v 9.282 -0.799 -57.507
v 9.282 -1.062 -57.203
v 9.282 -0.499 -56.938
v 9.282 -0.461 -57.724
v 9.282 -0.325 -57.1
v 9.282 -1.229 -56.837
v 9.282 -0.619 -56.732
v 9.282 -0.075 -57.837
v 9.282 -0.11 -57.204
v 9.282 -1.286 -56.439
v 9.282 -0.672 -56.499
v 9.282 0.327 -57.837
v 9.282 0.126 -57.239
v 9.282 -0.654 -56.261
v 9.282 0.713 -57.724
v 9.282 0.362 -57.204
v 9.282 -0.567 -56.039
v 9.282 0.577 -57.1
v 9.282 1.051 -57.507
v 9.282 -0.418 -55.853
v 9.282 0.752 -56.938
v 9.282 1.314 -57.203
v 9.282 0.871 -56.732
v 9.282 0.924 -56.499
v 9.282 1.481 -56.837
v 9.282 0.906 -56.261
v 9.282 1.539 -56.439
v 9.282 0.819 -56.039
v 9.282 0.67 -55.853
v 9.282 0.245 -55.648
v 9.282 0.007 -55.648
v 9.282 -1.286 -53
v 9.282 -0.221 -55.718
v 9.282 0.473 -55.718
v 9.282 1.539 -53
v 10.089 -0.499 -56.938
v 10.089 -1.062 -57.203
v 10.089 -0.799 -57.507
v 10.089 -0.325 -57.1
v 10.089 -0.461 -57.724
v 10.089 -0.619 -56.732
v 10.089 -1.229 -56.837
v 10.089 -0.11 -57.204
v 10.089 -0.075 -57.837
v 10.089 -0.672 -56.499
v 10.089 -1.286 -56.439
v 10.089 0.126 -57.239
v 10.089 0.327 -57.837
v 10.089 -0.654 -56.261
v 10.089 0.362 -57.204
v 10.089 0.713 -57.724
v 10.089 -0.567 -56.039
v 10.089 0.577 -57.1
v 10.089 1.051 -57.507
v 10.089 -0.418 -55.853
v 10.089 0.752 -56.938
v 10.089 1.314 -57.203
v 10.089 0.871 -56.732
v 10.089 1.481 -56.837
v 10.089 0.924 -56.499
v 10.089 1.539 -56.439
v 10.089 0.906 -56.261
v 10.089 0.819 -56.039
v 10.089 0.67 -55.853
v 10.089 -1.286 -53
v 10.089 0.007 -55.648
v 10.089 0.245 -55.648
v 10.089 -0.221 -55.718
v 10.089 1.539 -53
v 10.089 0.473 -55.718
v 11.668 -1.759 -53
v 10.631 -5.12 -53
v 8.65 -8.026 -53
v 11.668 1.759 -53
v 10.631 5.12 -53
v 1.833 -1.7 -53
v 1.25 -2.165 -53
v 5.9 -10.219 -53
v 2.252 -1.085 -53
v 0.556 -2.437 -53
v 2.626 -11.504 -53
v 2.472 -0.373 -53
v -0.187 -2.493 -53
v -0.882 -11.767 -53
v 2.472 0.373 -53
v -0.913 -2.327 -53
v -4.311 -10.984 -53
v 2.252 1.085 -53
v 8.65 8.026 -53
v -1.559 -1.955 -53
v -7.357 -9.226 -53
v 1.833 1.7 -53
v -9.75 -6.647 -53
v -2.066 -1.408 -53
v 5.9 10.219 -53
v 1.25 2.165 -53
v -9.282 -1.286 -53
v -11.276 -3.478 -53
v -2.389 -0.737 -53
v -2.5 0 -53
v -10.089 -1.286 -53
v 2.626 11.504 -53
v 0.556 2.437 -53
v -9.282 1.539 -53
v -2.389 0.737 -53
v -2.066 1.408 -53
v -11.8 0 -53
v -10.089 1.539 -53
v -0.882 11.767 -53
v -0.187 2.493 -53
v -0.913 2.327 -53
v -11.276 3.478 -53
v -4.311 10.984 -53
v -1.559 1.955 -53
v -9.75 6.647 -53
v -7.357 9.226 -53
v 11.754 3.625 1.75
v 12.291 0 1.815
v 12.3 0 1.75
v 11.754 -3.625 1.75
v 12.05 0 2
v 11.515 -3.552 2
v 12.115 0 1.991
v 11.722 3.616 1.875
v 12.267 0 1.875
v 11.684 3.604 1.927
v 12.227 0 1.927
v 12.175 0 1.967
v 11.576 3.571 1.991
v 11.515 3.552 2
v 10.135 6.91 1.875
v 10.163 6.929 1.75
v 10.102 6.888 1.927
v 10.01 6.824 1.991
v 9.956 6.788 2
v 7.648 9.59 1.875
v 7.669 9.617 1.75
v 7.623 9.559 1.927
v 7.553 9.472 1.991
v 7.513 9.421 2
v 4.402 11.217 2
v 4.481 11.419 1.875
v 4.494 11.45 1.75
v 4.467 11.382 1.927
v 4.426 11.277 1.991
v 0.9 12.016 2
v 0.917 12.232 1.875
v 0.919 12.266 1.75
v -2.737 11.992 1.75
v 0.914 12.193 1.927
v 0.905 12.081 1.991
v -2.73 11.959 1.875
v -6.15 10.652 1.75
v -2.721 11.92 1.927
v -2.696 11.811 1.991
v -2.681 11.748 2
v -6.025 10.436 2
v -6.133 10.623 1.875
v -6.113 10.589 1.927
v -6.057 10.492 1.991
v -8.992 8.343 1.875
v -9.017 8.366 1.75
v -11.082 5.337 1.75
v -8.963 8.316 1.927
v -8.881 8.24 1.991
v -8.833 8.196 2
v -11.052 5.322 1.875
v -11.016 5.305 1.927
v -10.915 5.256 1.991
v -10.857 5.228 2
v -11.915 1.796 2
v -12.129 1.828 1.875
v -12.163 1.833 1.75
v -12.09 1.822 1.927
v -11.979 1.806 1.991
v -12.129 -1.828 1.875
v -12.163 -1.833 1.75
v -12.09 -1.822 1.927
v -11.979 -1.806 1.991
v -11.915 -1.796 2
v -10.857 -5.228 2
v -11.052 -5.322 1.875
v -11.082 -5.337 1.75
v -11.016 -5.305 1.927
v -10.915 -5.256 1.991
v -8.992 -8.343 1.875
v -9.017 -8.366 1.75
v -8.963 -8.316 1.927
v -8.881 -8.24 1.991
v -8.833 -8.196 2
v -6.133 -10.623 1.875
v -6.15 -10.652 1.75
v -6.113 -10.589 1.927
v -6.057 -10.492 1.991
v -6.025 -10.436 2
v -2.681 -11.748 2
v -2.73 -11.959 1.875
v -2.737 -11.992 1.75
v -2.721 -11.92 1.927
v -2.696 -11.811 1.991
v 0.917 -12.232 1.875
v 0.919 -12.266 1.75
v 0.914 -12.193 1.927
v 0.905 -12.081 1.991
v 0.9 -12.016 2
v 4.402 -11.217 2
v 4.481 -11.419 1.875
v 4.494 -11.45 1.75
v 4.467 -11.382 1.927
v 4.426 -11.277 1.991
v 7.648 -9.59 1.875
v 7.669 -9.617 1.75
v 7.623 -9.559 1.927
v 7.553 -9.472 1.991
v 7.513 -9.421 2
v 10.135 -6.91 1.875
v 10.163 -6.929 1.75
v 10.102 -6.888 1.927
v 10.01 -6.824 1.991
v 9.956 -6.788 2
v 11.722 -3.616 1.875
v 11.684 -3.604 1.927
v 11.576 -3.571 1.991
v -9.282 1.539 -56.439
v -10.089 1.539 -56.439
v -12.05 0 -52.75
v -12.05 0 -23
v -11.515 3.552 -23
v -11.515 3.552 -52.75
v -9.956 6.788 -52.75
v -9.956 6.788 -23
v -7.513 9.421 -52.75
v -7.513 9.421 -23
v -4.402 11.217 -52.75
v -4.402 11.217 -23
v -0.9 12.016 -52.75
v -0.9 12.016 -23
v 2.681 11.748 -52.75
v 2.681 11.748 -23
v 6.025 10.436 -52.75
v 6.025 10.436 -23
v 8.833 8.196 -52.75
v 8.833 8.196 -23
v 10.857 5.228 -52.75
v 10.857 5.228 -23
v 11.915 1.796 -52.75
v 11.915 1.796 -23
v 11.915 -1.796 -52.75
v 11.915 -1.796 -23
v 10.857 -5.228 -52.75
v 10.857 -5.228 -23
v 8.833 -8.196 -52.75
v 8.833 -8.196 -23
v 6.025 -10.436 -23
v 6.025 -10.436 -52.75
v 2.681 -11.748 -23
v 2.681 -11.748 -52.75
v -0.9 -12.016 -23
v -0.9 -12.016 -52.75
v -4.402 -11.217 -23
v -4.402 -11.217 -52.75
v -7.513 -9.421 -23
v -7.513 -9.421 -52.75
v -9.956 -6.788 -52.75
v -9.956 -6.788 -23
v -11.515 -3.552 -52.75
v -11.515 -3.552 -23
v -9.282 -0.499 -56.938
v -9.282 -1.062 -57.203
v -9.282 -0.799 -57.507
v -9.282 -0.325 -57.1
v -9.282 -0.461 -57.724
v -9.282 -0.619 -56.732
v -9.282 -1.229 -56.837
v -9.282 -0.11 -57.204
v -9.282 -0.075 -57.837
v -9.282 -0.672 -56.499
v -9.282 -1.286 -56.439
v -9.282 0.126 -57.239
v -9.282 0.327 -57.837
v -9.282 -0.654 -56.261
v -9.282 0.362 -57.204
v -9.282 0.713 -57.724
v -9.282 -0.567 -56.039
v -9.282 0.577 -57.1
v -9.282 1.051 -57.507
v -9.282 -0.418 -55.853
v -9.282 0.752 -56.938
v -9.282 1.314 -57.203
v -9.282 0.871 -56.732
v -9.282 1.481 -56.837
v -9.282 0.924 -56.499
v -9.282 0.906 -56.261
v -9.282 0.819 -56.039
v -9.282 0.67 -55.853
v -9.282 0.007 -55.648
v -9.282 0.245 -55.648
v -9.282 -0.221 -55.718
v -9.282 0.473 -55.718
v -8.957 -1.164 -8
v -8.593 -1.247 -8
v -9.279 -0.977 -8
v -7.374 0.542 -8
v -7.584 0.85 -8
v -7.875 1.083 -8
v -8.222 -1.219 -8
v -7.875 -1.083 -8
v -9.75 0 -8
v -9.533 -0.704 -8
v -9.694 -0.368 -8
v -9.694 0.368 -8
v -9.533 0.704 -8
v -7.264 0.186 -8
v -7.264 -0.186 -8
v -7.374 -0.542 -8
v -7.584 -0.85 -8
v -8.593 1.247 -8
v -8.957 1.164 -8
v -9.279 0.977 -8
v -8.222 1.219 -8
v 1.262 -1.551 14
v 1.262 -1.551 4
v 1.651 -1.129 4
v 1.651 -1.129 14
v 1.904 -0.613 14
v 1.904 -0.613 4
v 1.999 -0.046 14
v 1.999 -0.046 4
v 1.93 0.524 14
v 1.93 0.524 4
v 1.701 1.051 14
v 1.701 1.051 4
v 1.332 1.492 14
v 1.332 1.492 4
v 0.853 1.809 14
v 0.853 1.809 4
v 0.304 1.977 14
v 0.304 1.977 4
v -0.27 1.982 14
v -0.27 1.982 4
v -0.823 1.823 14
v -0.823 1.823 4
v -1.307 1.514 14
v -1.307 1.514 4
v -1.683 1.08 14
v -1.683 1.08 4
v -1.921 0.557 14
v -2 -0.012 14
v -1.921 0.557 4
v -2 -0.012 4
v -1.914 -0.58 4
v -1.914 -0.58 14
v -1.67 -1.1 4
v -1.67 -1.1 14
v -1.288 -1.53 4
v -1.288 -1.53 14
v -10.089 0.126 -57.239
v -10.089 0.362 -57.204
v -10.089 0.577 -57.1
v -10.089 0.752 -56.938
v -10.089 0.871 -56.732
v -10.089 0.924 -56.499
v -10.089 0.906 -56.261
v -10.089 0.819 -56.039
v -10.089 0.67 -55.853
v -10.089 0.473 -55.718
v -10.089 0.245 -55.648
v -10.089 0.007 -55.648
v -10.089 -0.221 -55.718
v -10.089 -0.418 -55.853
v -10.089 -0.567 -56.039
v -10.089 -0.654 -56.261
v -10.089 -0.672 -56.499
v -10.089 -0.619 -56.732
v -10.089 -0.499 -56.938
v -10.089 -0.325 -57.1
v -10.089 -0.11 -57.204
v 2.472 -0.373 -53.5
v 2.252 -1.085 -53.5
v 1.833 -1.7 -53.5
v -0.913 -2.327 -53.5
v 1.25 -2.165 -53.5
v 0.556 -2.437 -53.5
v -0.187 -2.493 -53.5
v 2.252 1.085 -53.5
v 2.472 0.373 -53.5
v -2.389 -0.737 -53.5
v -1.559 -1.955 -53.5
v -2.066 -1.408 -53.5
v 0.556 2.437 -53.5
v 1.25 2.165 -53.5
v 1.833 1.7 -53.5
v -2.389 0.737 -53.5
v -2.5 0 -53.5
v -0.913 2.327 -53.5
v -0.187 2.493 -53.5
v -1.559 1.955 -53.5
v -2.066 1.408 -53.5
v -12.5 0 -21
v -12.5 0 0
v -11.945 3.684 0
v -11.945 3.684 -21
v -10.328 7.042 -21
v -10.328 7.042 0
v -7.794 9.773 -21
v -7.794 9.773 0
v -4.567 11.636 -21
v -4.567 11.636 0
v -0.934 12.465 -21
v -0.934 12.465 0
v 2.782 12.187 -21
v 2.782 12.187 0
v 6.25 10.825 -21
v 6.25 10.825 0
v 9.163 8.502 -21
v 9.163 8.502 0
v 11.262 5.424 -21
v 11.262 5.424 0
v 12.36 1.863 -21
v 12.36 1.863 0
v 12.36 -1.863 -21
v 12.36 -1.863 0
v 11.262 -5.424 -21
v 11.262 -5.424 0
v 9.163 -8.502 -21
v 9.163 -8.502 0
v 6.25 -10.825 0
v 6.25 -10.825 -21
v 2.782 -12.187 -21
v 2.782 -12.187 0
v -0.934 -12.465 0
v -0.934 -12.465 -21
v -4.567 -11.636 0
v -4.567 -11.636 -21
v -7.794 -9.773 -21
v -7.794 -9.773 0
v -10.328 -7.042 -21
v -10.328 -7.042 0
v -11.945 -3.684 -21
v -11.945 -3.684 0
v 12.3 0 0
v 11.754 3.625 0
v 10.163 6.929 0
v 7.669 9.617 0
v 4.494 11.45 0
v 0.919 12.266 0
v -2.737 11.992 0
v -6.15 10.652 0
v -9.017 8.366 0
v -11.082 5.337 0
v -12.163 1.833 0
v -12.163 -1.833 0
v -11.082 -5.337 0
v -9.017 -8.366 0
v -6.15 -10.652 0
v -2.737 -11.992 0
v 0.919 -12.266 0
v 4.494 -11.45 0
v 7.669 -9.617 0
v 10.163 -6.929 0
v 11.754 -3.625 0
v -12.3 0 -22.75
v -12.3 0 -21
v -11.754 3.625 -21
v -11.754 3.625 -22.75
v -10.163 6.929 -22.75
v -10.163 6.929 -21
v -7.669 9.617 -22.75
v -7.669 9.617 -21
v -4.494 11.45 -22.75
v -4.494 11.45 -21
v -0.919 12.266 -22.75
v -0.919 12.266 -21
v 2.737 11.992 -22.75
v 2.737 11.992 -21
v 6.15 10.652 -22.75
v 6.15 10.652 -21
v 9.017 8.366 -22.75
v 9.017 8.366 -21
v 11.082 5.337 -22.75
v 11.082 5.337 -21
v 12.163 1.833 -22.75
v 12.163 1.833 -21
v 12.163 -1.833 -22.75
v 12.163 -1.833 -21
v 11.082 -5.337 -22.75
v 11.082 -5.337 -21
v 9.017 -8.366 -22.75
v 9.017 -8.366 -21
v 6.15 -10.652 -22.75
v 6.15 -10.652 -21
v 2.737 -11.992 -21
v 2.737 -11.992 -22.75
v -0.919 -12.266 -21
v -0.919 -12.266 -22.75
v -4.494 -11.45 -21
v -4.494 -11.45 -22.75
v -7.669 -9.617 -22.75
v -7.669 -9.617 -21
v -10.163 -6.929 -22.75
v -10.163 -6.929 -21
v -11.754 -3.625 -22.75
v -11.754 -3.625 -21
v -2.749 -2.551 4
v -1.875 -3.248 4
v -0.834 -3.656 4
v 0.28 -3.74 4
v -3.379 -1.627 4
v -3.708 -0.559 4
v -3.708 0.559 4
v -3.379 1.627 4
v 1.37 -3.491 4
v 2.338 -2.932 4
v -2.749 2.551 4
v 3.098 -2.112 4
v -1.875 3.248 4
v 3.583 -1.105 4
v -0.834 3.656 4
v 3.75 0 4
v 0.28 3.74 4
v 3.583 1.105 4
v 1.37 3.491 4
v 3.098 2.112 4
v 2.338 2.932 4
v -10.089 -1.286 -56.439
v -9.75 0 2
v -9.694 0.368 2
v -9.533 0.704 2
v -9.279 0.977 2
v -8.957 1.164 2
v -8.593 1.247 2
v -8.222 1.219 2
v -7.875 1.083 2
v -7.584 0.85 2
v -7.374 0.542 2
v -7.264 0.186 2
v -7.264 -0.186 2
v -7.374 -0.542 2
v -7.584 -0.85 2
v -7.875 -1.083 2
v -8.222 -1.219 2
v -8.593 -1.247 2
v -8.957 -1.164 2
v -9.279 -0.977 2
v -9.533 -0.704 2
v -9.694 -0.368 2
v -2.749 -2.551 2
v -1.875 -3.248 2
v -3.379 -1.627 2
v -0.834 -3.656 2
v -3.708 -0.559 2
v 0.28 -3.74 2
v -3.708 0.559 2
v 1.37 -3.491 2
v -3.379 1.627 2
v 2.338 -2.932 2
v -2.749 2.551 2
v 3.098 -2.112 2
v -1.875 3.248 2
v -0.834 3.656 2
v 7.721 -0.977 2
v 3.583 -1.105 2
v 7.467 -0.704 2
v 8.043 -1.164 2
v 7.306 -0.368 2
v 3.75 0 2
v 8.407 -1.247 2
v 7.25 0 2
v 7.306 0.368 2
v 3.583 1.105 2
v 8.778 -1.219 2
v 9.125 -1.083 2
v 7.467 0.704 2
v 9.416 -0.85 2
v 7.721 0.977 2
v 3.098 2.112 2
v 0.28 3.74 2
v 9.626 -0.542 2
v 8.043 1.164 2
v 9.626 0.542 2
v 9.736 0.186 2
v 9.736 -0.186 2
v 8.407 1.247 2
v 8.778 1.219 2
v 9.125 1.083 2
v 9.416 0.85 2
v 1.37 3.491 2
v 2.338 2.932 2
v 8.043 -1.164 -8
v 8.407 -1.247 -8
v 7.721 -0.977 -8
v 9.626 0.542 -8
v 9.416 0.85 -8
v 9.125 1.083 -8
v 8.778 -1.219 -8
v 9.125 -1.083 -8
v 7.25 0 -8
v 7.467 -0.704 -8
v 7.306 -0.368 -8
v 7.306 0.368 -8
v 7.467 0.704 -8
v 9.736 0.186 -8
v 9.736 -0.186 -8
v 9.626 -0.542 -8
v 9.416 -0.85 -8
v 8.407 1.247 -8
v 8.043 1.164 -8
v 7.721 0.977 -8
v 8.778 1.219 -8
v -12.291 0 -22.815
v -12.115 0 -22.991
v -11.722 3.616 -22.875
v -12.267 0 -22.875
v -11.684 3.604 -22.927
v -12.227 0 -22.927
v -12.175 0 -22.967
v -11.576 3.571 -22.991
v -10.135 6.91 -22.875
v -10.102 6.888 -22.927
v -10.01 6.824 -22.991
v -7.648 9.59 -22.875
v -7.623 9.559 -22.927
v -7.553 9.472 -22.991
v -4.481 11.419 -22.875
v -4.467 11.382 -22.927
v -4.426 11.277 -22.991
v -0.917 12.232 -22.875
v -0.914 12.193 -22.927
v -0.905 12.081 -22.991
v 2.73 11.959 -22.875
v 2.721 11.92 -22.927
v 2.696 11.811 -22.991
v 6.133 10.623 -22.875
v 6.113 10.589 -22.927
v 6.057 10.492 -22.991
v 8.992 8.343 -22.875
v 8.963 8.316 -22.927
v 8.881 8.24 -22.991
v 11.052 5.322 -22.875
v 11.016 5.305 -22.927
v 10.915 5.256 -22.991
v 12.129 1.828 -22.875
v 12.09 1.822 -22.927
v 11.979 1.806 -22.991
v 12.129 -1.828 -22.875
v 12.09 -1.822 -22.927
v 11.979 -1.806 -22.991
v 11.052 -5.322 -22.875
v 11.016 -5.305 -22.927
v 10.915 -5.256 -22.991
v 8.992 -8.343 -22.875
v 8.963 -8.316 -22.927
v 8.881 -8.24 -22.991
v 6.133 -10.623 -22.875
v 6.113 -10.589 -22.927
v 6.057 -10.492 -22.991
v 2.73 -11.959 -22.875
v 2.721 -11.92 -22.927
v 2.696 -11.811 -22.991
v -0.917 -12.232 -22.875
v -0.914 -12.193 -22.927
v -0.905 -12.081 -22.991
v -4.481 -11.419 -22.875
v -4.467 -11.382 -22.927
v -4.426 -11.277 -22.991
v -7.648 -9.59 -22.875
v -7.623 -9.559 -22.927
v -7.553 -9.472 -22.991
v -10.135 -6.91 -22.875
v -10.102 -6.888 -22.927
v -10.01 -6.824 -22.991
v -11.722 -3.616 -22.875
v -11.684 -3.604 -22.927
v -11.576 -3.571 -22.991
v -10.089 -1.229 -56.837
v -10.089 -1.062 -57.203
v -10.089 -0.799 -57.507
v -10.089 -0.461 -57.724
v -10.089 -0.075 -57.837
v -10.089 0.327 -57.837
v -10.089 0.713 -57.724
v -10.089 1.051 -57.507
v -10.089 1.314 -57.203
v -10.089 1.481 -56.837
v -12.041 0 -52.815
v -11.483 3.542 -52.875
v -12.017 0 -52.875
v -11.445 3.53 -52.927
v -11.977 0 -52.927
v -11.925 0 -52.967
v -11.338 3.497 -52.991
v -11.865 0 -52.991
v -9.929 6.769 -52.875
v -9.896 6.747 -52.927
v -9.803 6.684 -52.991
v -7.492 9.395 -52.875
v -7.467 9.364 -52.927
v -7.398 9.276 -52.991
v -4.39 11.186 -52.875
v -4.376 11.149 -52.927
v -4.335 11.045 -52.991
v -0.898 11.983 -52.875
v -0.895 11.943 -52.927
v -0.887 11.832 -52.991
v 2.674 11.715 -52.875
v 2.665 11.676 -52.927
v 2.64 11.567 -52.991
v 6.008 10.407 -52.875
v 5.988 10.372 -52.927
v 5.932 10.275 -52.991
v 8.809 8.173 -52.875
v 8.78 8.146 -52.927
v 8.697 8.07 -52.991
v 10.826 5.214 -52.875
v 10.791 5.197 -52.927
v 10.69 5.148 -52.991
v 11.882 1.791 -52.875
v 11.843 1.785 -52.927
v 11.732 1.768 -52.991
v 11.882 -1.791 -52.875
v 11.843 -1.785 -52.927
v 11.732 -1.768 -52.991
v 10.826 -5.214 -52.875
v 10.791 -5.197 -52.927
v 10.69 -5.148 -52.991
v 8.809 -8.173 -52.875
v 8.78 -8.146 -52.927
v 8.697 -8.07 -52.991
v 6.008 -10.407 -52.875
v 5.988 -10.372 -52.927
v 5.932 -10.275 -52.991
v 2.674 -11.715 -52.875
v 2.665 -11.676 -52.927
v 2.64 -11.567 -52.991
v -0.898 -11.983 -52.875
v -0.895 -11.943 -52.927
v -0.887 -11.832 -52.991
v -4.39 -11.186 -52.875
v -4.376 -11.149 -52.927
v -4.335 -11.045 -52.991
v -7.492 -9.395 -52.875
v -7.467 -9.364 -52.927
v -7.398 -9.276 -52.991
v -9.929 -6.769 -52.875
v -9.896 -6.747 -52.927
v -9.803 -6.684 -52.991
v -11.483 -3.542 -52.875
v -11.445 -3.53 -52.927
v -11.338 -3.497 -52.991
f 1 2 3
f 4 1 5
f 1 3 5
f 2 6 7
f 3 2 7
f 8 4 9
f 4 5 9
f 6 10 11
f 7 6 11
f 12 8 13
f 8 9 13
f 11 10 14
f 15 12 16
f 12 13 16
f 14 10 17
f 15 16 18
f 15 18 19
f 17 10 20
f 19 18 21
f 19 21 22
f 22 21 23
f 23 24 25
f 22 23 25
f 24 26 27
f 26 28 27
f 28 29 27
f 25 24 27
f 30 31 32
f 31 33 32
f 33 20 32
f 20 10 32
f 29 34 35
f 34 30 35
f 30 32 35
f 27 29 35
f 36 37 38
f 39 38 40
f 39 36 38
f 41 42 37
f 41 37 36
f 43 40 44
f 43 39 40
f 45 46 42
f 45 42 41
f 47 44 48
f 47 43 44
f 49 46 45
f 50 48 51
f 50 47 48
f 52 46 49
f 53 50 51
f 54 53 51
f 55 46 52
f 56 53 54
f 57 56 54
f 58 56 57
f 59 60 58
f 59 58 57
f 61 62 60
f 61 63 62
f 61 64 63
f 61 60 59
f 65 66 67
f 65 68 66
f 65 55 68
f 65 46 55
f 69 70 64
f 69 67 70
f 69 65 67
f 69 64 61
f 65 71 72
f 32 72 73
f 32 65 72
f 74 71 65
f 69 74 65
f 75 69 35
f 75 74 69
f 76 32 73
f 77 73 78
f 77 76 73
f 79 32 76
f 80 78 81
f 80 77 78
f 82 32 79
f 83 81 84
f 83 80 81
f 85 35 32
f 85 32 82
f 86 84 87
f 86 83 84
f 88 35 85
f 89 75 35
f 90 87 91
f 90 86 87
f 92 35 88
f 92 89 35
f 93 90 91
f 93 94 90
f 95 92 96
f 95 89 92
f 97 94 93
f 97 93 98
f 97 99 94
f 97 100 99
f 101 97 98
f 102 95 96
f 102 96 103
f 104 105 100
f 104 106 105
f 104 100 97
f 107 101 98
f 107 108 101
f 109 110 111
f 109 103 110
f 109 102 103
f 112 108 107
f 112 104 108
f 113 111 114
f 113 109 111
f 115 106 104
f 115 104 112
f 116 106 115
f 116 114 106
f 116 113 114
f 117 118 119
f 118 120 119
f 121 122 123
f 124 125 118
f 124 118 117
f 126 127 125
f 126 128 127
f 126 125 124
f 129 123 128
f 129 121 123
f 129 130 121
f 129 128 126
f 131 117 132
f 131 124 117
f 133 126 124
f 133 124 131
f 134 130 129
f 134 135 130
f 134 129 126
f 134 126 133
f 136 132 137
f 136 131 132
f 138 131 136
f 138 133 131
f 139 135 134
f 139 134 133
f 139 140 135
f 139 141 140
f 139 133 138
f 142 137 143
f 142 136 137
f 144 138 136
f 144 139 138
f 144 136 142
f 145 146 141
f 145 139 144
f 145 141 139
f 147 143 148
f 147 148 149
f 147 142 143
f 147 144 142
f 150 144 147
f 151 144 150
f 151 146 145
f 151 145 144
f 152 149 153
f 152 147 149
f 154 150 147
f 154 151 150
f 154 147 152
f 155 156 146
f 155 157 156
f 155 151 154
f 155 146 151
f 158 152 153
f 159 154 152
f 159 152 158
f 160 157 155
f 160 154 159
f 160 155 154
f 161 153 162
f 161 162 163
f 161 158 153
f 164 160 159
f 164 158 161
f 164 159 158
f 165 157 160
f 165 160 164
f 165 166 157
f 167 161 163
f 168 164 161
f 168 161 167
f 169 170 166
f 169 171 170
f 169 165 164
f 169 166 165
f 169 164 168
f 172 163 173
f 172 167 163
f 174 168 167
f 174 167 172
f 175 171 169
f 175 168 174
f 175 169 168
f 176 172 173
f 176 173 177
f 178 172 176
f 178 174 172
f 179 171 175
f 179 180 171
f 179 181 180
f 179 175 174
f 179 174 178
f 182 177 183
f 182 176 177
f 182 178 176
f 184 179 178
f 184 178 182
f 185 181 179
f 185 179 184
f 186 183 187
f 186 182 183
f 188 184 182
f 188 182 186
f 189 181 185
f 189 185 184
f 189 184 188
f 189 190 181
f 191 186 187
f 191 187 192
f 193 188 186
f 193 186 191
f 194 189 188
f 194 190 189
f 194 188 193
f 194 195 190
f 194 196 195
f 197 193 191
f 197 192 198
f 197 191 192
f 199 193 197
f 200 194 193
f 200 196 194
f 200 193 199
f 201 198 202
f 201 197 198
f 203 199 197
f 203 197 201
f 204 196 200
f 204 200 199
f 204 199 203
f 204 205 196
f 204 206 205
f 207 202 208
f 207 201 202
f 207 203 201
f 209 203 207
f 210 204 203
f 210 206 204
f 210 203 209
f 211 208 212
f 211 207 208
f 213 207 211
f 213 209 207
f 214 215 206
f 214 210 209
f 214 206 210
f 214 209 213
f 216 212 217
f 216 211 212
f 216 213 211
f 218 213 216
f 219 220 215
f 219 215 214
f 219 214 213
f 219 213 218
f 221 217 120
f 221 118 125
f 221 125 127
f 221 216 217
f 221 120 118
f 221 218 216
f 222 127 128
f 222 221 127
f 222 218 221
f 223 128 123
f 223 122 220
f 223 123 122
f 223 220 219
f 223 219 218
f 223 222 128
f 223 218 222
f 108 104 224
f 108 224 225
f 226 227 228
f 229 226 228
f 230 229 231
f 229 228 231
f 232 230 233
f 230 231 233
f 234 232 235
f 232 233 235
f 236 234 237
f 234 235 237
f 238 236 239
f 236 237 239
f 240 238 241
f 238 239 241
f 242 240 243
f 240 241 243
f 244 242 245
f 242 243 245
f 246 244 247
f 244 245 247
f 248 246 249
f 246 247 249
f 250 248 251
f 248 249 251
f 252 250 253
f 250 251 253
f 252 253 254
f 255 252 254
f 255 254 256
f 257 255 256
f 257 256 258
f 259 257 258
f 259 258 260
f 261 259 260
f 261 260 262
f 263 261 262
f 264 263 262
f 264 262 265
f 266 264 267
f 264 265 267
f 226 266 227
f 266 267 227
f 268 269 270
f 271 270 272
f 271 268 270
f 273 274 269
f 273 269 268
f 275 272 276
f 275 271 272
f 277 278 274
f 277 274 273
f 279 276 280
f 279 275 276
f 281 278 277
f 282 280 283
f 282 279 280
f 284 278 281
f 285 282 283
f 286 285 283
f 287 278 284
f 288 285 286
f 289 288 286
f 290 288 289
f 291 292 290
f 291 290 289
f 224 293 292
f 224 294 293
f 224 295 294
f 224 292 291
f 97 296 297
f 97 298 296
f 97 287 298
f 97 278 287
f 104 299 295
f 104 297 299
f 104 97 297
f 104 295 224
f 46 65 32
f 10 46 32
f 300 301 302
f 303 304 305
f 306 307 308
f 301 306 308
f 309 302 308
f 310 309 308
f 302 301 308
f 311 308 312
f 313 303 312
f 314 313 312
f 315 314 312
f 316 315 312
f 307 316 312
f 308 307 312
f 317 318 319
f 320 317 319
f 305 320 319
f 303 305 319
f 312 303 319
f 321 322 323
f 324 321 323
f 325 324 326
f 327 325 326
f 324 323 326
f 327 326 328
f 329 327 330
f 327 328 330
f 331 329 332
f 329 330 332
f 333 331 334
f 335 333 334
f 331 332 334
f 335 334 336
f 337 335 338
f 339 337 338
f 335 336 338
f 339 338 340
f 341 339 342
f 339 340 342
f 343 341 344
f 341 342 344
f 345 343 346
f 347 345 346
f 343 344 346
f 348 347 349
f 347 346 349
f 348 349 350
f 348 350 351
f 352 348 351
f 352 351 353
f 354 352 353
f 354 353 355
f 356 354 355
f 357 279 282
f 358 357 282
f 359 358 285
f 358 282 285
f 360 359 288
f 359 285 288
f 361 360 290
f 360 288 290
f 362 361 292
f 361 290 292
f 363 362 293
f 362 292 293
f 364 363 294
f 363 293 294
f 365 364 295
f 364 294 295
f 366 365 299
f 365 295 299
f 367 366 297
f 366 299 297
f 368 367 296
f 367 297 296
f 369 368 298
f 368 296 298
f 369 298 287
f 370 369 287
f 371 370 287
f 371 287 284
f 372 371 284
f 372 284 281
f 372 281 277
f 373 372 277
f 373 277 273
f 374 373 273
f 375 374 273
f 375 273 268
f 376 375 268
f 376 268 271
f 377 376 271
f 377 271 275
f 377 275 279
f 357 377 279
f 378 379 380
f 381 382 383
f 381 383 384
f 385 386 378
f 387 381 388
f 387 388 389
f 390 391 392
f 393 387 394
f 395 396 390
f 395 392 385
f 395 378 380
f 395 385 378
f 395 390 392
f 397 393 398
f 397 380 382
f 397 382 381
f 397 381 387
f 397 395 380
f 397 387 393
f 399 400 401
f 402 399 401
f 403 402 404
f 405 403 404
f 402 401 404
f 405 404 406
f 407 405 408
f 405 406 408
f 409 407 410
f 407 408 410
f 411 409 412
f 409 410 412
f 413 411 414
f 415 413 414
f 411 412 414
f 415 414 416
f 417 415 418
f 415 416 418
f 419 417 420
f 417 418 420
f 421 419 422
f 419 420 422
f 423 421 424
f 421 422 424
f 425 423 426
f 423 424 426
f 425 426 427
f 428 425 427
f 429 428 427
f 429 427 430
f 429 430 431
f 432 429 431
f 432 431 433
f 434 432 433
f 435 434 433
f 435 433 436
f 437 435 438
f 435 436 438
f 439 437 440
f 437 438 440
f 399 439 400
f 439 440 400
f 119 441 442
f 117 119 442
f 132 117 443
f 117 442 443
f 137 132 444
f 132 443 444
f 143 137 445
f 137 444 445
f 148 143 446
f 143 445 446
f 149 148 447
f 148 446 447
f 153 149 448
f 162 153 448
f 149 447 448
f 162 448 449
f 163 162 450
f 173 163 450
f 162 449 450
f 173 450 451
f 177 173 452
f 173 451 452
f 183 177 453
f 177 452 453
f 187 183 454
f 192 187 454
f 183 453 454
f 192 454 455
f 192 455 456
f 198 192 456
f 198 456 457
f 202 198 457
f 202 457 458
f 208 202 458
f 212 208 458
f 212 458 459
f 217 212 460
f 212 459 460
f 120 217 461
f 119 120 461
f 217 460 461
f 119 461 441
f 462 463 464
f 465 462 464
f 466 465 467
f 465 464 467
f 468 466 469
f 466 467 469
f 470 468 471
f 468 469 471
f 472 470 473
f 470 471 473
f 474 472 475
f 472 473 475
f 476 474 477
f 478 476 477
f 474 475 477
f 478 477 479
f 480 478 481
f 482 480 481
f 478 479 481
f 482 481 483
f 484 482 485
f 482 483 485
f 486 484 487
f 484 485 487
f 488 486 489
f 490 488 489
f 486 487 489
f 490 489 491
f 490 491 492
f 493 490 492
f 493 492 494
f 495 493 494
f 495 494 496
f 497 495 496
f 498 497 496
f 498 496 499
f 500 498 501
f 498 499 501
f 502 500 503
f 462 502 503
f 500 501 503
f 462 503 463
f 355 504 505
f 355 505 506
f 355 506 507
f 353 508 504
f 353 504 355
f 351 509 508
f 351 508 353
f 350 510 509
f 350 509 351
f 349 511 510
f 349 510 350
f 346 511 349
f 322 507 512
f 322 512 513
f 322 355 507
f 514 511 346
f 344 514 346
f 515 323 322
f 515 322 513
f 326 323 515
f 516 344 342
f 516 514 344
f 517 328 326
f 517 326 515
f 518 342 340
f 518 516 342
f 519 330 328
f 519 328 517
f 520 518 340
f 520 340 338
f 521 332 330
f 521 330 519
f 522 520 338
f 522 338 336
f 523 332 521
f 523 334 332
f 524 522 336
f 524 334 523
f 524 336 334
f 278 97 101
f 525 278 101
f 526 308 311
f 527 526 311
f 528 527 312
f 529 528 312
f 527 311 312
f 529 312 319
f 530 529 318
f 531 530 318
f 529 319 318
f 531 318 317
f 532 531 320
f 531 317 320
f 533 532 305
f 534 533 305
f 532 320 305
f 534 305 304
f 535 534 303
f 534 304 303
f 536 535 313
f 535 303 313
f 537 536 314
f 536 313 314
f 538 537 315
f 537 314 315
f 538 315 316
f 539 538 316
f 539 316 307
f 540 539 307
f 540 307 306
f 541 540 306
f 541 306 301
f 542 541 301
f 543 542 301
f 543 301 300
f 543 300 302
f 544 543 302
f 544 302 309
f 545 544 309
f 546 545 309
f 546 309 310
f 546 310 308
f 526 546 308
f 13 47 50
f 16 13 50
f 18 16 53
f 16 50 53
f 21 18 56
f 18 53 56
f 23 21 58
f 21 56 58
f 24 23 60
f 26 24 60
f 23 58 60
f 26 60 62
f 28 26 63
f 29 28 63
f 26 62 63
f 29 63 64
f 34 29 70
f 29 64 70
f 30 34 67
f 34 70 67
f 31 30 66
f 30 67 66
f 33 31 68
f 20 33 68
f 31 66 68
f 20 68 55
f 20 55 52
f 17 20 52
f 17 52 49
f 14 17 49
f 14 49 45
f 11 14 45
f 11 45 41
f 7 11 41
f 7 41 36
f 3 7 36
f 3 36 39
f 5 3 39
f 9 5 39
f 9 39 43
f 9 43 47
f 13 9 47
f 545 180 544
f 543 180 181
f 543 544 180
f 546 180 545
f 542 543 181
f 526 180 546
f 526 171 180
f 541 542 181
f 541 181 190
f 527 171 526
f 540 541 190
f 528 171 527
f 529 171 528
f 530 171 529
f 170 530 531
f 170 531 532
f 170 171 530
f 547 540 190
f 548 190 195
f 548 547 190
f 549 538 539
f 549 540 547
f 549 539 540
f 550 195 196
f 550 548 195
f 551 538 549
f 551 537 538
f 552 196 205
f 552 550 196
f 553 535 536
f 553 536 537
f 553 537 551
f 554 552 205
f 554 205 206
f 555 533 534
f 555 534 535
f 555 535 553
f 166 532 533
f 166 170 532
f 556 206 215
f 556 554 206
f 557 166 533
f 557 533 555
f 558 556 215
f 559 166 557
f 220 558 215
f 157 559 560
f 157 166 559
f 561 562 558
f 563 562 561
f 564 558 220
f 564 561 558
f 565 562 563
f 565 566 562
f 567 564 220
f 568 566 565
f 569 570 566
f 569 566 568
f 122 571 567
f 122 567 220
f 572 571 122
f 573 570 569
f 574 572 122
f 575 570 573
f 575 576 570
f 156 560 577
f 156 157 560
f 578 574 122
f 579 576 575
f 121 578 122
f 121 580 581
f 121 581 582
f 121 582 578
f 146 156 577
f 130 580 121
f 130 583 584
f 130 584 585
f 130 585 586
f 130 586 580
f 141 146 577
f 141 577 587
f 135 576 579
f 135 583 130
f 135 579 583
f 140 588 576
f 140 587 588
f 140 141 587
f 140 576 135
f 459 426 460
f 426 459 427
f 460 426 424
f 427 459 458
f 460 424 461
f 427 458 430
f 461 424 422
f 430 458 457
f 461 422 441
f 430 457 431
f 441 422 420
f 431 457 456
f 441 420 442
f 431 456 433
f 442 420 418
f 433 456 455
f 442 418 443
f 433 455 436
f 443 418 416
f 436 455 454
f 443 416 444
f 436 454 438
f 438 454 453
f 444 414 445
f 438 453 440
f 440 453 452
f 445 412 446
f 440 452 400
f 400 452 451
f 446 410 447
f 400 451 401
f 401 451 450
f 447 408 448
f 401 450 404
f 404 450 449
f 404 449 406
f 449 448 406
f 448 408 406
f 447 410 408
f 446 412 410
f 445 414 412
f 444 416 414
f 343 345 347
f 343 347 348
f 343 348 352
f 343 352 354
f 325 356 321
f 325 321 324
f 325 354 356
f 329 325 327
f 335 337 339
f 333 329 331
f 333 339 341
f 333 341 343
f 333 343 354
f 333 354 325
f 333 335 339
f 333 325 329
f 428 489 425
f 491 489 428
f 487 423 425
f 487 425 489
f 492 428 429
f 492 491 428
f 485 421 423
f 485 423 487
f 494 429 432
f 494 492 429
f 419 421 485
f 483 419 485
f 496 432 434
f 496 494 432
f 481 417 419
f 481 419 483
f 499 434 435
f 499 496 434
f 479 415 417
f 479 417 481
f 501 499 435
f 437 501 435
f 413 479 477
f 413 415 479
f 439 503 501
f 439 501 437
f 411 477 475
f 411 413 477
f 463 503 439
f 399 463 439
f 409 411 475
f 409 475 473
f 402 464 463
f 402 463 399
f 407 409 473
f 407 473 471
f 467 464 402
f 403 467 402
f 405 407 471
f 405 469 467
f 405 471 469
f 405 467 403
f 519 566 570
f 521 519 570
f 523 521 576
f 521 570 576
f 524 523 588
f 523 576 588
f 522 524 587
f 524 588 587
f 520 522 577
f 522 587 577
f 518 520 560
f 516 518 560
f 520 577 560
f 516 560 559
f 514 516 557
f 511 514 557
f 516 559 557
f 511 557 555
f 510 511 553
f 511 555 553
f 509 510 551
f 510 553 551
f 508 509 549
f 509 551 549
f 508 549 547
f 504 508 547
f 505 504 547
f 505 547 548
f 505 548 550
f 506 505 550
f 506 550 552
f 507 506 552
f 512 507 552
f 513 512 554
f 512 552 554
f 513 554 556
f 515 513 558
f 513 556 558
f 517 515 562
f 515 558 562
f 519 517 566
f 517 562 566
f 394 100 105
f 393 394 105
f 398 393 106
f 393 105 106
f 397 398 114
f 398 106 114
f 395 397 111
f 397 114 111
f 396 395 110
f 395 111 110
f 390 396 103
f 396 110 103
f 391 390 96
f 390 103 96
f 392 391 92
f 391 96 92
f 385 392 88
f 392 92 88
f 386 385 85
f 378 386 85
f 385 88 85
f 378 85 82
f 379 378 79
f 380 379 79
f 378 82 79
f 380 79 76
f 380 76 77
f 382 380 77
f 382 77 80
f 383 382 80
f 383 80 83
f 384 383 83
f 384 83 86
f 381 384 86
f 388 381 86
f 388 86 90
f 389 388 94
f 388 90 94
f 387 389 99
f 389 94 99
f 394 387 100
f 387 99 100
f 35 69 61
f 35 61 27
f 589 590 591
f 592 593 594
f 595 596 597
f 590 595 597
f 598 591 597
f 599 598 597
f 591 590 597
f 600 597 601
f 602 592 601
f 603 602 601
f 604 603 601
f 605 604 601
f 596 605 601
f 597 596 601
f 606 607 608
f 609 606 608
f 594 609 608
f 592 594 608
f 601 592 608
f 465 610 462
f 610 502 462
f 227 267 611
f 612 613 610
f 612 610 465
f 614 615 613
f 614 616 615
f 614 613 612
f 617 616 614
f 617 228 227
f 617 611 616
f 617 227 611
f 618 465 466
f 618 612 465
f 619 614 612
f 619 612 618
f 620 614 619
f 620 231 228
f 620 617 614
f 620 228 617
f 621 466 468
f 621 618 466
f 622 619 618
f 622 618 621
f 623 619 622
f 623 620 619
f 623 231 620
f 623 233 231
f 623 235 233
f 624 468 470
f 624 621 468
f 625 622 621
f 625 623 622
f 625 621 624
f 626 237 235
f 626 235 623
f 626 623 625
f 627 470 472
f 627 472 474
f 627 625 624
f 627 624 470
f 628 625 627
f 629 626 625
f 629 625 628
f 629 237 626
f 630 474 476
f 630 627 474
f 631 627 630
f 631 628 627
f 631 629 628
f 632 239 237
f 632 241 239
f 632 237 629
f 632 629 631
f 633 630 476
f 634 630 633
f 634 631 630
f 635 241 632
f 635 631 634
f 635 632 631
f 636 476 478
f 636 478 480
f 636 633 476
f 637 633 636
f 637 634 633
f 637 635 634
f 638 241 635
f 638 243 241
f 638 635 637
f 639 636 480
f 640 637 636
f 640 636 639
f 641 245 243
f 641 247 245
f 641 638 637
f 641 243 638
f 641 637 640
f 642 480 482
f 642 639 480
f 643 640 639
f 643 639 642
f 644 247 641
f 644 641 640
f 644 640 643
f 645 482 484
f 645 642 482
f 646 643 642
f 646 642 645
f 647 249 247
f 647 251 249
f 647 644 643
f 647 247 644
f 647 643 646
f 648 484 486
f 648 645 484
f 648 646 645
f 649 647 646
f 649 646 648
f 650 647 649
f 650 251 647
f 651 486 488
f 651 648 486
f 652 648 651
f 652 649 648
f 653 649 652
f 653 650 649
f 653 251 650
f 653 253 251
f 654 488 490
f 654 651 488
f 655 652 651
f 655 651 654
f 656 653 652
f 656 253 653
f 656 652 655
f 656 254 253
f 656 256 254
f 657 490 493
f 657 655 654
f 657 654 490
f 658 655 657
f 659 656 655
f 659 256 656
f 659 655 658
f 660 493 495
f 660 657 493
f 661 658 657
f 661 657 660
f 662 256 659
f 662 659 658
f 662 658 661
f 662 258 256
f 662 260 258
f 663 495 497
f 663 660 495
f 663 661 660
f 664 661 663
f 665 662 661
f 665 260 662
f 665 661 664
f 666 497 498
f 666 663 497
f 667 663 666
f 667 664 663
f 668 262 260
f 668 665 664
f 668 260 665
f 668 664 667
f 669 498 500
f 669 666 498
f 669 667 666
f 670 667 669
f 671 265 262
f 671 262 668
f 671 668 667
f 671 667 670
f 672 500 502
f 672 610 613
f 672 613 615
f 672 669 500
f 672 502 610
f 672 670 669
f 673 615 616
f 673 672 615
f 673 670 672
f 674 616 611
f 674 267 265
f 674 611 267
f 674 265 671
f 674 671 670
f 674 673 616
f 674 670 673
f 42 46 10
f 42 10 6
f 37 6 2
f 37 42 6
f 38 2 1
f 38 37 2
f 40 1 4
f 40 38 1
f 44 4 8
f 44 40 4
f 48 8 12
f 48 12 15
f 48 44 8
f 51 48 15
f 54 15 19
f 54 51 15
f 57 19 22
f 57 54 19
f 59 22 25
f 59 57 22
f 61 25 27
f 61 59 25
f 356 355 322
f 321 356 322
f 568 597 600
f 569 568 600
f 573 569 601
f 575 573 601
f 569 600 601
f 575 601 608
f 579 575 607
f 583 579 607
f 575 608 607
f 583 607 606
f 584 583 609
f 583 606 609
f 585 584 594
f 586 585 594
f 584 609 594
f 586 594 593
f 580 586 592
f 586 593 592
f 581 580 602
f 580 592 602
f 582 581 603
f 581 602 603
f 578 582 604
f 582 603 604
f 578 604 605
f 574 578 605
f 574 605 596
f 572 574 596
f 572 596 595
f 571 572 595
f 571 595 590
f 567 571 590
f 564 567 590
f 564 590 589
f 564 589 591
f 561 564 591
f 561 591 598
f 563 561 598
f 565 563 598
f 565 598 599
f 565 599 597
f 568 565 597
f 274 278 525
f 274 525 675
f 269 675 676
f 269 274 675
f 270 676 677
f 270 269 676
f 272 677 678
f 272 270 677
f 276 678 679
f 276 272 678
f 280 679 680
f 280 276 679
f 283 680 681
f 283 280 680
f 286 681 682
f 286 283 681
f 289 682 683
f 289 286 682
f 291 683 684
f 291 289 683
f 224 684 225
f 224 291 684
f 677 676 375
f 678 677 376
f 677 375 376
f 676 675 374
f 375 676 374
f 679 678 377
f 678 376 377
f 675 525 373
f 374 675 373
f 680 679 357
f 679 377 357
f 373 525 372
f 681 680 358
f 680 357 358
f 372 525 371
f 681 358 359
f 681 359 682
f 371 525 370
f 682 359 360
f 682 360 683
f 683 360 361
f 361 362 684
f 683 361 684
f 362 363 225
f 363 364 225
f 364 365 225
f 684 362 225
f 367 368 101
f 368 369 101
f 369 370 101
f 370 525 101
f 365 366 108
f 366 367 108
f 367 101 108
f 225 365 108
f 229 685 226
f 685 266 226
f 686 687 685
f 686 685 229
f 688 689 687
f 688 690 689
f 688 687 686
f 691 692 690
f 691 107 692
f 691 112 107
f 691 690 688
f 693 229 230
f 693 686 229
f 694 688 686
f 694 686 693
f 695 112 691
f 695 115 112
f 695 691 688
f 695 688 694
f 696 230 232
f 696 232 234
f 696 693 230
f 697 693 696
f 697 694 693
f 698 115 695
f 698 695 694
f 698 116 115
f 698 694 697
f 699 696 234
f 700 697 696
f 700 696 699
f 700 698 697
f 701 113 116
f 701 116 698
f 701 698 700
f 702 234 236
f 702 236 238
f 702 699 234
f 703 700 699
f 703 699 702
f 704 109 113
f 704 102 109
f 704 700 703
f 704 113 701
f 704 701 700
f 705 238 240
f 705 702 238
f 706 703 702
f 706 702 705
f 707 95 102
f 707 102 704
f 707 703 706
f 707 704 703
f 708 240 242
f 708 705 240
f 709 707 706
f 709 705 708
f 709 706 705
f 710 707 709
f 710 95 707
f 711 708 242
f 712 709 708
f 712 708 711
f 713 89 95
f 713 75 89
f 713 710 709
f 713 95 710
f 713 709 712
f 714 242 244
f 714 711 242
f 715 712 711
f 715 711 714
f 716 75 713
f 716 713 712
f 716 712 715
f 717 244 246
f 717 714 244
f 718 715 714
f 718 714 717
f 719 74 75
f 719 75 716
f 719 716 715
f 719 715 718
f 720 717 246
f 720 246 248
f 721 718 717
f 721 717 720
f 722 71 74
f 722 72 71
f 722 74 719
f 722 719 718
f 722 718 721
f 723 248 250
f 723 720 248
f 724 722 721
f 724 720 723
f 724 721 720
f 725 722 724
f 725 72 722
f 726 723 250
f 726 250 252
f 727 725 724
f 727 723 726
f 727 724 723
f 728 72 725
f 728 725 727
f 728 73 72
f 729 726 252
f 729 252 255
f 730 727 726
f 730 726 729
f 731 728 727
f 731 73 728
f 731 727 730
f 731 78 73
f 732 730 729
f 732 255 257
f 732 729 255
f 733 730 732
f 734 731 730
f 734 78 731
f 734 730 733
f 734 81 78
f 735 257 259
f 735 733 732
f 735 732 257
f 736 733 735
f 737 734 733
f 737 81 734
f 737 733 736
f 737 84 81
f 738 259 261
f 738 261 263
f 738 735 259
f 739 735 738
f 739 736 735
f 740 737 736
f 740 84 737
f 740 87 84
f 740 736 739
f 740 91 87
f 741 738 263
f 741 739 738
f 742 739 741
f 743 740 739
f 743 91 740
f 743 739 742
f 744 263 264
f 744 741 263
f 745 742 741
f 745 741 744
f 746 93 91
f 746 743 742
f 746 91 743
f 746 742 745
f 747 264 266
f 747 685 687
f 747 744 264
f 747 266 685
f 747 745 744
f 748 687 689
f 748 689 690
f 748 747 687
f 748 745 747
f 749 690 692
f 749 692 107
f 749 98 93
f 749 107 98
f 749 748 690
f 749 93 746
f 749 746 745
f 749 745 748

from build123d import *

# Parameters (mm, degrees)
SKETCH1_R                       = 12.3
BOSS_EXTRUDE1_DEPTH             = 2
FILLET1_R                       = 0.25
SKETCH3_R                       = 12.5
BOSS_EXTRUDE3_DEPTH             = 21
SKETCH4_R                       = 12.3
BOSS_EXTRUDE4_DEPTH             = 2
FILLET3_R                       = 0.25
SKETCH5_R                       = 12.05
BOSS_EXTRUDE5_DEPTH             = 30
FILLET4_R                       = 0.25
SKETCH6_W                       = 0.807133711
SKETCH6_H                       = 2.824967988
BOSS_EXTRUDE6_DEPTH             = 5
SKETCH7_R                       = 0.8
CUT_EXTRUDE1_DEPTH              = 23.589171386
SKETCH8_R                       = 2.5
BOSS_EXTRUDE7_DEPTH             = 0.5
SKETCH9_R                       = 3.75
BOSS_EXTRUDE8_DEPTH             = 2
BOSS_EXTRUDE9_DEPTH             = 10
TAP_DRILL_FOR_M3X0_5_TAP1_D     = 2.5
TAP_DRILL_FOR_M3X0_5_TAP1_DEPTH = 10


with BuildPart() as part:
    # Sketch1 → Boss-Extrude1 (new body)
    with BuildSketch(Plane.XY):
        Circle(SKETCH1_R)
    extrude(amount=BOSS_EXTRUDE1_DEPTH)

    # Fillet1
    fillet1_edges = [part.edges().sort_by_distance(p)[0] for p in [
        (-12.3, 0, 2),
    ]]
    fillet(fillet1_edges, radius=FILLET1_R)

    # Sketch3 → Boss-Extrude3 (add)
    with BuildSketch(Plane(origin=(0, 0, 0), x_dir=(-1, 0, 0), z_dir=(0, 0, -1))):
        Circle(SKETCH3_R)
    extrude(amount=BOSS_EXTRUDE3_DEPTH)

    # Sketch4 → Boss-Extrude4 (add)
    with BuildSketch(Plane(origin=(0, 0, -21), x_dir=(-1, 0, 0), z_dir=(0, 0, -1))):
        Circle(SKETCH4_R)
    extrude(amount=BOSS_EXTRUDE4_DEPTH)

    # Fillet3
    fillet3_edges = [part.edges().sort_by_distance(p)[0] for p in [
        (12.3, 0, -23),
    ]]
    fillet(fillet3_edges, radius=FILLET3_R)

    # Sketch5 → Boss-Extrude5 (add)
    with BuildSketch(Plane(origin=(0, 0, -23), x_dir=(-1, 0, 0), z_dir=(0, 0, -1))):
        Circle(SKETCH5_R)
    extrude(amount=BOSS_EXTRUDE5_DEPTH)

    # Fillet4
    fillet4_edges = [part.edges().sort_by_distance(p)[0] for p in [
        (12.05, 0, -53),
    ]]
    fillet(fillet4_edges, radius=FILLET4_R)

    # Sketch6 → Boss-Extrude6 (add)
    with BuildSketch(Plane(origin=(0, 0, -53), x_dir=(-1, 0, 0), z_dir=(0, 0, -1))):
        with Locations((-9.685604531, 0.126114642)):
            Rectangle(SKETCH6_W, SKETCH6_H)
        with Locations((9.685604531, 0.126114642)):
            Rectangle(SKETCH6_W, SKETCH6_H)
    extrude(amount=BOSS_EXTRUDE6_DEPTH)

    # Sketch7 → Cut-Extrude1 (cut, through all)
    with BuildSketch(Plane(origin=(10.089171386, 0, 0), x_dir=(0, 0, -1), z_dir=(1, 0, 0))):
        with Locations((56.439265275, 0.126114642)):
            Circle(SKETCH7_R)
        with BuildLine():
            Line((56.439265275, 1.538598636), (58, 1.538598636))
            Line((58, 1.538598636), (58, -1.286369352))
            Line((58, -1.286369352), (56.439265275, -1.286369352))
            ThreePointArc((56.439265275, -1.286369352), (57.851749269, 0.126114642), (56.439265275, 1.538598636))
        make_face()
    extrude(amount=-CUT_EXTRUDE1_DEPTH, mode=Mode.SUBTRACT)

    # Sketch8 → Boss-Extrude7 (add)
    with BuildSketch(Plane(origin=(0, 0, -53), x_dir=(-1, 0, 0), z_dir=(0, 0, -1))):
        Circle(SKETCH8_R)
    extrude(amount=BOSS_EXTRUDE7_DEPTH)

    # Sketch9 → Boss-Extrude8 (add)
    with BuildSketch(Plane.XY.offset(2)):
        Circle(SKETCH9_R)
    extrude(amount=BOSS_EXTRUDE8_DEPTH)

    # Sketch10 → Boss-Extrude9 (add)
    with BuildSketch(Plane.XY.offset(4)):
        with BuildLine():
            Line((-1.288271492, -1.529822396), (1.262174935, -1.551423357))
            ThreePointArc((1.262174935, -1.551423357), (0.016938357, 1.999928272), (-1.288271492, -1.529822396))
        make_face()
    extrude(amount=BOSS_EXTRUDE9_DEPTH)

    # Tap Drill for M3x0.5 Tap1
    with Locations(Plane.XY.offset(2)):
        with Locations((8.5, 0), (-8.5, 0)):
            Hole(TAP_DRILL_FOR_M3X0_5_TAP1_D / 2, depth=TAP_DRILL_FOR_M3X0_5_TAP1_DEPTH)


solid = part.part
